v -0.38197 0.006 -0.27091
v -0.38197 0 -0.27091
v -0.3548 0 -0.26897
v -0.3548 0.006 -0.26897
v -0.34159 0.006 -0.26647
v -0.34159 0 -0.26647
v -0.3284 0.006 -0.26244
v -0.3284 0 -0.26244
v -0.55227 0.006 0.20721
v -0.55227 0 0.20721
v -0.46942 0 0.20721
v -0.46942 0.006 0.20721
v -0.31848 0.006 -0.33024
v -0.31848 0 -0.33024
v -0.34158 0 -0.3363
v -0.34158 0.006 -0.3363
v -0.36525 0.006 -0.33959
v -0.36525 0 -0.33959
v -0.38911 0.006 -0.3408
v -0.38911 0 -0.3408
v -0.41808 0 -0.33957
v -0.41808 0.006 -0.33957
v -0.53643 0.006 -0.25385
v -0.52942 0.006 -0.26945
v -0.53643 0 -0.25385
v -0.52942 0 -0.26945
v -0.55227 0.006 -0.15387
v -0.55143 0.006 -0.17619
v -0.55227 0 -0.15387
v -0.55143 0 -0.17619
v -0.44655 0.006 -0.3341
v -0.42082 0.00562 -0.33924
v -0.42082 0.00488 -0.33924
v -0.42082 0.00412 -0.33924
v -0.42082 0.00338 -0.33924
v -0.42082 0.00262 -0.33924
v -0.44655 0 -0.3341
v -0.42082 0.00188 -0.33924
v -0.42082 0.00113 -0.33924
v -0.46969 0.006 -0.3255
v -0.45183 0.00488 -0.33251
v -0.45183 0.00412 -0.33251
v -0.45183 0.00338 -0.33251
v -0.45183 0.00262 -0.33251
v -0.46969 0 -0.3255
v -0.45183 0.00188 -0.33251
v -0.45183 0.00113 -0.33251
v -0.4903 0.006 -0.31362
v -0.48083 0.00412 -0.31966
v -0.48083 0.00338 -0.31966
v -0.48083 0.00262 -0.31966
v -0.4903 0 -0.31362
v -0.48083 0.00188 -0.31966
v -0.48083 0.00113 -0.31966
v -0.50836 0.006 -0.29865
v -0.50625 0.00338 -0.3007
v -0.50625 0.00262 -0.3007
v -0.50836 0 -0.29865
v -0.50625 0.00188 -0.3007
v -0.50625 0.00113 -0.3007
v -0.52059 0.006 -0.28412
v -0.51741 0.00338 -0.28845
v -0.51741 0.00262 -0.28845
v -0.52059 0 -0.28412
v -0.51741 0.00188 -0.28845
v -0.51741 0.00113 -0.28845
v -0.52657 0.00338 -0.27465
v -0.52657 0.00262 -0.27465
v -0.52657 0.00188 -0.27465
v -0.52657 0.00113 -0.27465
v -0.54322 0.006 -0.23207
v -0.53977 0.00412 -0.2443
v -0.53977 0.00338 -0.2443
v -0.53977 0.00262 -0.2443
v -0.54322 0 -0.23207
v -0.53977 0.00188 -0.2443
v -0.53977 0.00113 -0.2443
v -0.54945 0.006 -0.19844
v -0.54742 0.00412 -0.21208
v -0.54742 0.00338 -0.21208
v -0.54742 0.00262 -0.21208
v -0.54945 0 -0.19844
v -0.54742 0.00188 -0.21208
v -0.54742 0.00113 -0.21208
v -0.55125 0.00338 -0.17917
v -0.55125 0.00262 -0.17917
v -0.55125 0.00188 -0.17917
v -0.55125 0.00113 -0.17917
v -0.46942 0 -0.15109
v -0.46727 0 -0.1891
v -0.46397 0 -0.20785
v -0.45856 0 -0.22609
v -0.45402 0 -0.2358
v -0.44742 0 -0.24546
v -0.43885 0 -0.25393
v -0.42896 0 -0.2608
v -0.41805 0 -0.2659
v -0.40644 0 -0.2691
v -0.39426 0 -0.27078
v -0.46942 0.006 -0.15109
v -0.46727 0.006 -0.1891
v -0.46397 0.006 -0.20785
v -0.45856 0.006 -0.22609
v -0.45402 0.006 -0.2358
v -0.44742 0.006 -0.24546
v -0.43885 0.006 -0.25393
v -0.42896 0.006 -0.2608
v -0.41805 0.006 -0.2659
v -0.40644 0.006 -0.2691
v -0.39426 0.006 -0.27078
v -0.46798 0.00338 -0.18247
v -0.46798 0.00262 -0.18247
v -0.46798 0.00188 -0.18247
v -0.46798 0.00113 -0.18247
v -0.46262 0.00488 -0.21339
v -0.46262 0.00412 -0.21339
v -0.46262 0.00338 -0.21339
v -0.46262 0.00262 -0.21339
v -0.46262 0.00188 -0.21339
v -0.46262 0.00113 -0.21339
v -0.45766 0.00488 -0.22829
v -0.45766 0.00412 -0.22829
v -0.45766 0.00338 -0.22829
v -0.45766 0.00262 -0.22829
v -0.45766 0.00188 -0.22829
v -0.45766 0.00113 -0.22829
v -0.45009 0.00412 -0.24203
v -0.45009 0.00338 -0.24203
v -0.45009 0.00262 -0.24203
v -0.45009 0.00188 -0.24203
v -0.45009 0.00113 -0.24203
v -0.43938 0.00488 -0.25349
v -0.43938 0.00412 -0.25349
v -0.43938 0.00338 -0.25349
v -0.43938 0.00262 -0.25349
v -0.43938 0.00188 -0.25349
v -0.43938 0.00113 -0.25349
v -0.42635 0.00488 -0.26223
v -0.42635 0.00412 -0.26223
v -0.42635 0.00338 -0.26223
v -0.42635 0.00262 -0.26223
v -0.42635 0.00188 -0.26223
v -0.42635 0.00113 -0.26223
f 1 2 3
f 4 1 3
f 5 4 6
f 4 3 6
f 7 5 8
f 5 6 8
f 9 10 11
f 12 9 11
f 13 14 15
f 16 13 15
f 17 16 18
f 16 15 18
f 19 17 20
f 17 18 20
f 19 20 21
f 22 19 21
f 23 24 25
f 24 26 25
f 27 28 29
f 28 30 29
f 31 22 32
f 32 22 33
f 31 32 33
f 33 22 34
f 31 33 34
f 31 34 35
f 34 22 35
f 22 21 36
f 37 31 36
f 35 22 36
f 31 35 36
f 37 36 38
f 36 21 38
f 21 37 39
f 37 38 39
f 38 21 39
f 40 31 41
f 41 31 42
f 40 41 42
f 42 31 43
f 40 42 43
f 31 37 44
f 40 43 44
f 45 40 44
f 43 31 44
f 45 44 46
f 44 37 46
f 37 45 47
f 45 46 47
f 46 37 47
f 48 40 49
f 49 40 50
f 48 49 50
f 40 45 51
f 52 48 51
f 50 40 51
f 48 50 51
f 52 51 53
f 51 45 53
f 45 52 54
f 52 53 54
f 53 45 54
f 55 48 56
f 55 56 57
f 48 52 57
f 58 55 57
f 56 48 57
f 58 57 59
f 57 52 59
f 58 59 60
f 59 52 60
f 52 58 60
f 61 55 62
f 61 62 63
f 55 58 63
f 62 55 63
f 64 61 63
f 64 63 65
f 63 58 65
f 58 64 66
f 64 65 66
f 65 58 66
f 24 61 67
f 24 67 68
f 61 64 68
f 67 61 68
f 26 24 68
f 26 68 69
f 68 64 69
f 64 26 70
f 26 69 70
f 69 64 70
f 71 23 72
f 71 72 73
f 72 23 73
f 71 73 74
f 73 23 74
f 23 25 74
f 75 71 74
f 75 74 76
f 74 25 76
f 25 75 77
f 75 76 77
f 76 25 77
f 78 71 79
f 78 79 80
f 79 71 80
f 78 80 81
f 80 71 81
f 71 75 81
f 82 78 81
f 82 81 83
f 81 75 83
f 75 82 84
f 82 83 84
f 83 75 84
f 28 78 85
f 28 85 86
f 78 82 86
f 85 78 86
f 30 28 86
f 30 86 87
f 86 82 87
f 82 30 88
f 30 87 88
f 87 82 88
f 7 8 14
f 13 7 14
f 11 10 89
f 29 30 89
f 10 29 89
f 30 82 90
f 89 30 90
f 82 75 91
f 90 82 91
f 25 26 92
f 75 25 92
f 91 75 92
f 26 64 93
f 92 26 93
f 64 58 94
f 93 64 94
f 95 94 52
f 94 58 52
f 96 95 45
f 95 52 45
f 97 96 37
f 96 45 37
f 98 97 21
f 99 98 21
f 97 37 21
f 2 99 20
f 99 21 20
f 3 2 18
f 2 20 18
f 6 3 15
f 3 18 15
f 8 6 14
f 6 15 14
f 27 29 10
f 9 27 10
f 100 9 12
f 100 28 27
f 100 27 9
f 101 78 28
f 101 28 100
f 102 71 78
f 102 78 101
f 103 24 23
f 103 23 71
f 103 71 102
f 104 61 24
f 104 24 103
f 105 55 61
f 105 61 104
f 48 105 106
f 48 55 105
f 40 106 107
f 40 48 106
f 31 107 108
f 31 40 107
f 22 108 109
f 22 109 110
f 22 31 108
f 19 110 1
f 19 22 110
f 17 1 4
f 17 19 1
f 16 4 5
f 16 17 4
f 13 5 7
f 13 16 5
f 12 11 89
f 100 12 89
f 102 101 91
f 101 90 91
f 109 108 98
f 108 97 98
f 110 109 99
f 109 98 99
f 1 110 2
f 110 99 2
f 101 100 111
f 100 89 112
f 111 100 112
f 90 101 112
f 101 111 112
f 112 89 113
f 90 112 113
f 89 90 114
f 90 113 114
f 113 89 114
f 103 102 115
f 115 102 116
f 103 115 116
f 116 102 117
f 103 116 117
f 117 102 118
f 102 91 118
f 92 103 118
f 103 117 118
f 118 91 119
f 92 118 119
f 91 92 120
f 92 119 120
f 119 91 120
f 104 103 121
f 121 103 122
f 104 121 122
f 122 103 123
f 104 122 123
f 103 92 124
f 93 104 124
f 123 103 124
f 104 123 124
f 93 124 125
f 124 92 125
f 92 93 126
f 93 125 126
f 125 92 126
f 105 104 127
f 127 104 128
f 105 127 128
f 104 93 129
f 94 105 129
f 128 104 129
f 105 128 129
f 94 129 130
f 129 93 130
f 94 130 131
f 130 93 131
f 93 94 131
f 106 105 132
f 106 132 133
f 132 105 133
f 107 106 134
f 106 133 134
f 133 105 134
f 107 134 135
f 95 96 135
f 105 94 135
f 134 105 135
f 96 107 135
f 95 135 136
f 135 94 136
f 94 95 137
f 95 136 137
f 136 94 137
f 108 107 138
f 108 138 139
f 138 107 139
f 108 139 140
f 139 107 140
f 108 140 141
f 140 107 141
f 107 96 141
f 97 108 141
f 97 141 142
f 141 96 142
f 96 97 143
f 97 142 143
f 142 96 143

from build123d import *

# Parameters (mm, degrees)
EXTRUDE_1_DEPTH = 0.006


with BuildPart() as part:
    # Эскиз1 → Бобышка-Вытянуть1 (new body)
    with BuildSketch(Plane(origin=(0, 0, 0), x_dir=(1, 0, 0), z_dir=(0, 1, 0))):
        with BuildLine():
            Line((-0.552273294, -0.207212096), (-0.469416036, -0.207212096))
            Line((-0.469416036, -0.207212096), (-0.469416036, 0.15108915))
            add(Edge.make_bspline(
                [(-0.469416036, 0.15108915), (-0.469337668, 0.156710765), (-0.469187031, 0.167516567), (-0.468051363, 0.183019987), (-0.46630937, 0.197186892), (-0.463608191, 0.209875156), (-0.460547741, 0.221272508), (-0.456571693, 0.23120128), (-0.451914296, 0.239795103), (-0.446397888, 0.246954712), (-0.440258107, 0.252955311), (-0.433597544, 0.258071325), (-0.42638389, 0.262405578), (-0.418587315, 0.265910913), (-0.410168879, 0.268420499), (-0.401249065, 0.270140745), (-0.39178388, 0.27111474), (-0.385302473, 0.27097713), (-0.38196714, 0.270906316)],
                knots=[0, 0, 0, 0, 1.6863e-05, 3.2414e-05, 4.6615e-05, 5.9643e-05, 7.1304e-05, 8.1972e-05, 9.1656e-05, 0.000100534, 0.000108976, 0.000117344, 0.000125674, 0.00013417, 0.000142917, 0.000151963, 0.000161395, 0.000171395, 0.000171395, 0.000171395, 0.000171395], degree=3))
            add(Edge.make_bspline(
                [(-0.38196714, 0.270906316), (-0.376724267, 0.270742629), (-0.366722855, 0.270430378), (-0.352487182, 0.268821302), (-0.339787948, 0.266275374), (-0.332048262, 0.263667602), (-0.328395702, 0.262436926)],
                knots=[0, 0, 0, 0, 1.5731e-05, 3.0008e-05, 4.2936e-05, 5.449e-05, 5.449e-05, 5.449e-05, 5.449e-05], degree=3))
            Line((-0.328395702, 0.262436926), (-0.31847811, 0.330239773))
            add(Edge.make_bspline(
                [(-0.31847811, 0.330239773), (-0.320825798, 0.330991558), (-0.3256882, 0.332548615), (-0.333418866, 0.334595903), (-0.341857288, 0.336433721), (-0.354125933, 0.338423269), (-0.369943112, 0.340262822), (-0.382743691, 0.340624439), (-0.389109999, 0.340804288)],
                knots=[0, 0, 0, 0, 7.394e-06, 1.5315e-05, 2.3981e-05, 3.3292e-05, 5.2595e-05, 7.1694e-05, 7.1694e-05, 7.1694e-05, 7.1694e-05], degree=3))
            add(Edge.make_bspline(
                [(-0.389109999, 0.340804288), (-0.394998076, 0.340800326), (-0.406527444, 0.34079257), (-0.423393567, 0.339124687), (-0.439382173, 0.336197943), (-0.454537126, 0.331897822), (-0.468829459, 0.326183976), (-0.482280707, 0.319119391), (-0.494833003, 0.310665771), (-0.506548755, 0.300866426), (-0.517226948, 0.28936948), (-0.526323341, 0.27574323), (-0.534189517, 0.260273244), (-0.540589361, 0.242792298), (-0.545497563, 0.223351222), (-0.549276642, 0.201976128), (-0.551575084, 0.178573098), (-0.552034776, 0.16230595), (-0.552273294, 0.153865478)],
                knots=[0, 0, 0, 0, 1.7656e-05, 3.4571e-05, 5.0763e-05, 6.6363e-05, 8.1749e-05, 9.6857e-05, 0.000111857, 0.000127065, 0.000142591, 0.000158752, 0.000176048, 0.000194548, 0.000214471, 0.000236129, 0.000259614, 0.000284941, 0.000284941, 0.000284941, 0.000284941], degree=3))
            Line((-0.552273294, 0.153865478), (-0.552273294, -0.207212096))
        make_face()
    extrude(amount=EXTRUDE_1_DEPTH)


solid = part.part
